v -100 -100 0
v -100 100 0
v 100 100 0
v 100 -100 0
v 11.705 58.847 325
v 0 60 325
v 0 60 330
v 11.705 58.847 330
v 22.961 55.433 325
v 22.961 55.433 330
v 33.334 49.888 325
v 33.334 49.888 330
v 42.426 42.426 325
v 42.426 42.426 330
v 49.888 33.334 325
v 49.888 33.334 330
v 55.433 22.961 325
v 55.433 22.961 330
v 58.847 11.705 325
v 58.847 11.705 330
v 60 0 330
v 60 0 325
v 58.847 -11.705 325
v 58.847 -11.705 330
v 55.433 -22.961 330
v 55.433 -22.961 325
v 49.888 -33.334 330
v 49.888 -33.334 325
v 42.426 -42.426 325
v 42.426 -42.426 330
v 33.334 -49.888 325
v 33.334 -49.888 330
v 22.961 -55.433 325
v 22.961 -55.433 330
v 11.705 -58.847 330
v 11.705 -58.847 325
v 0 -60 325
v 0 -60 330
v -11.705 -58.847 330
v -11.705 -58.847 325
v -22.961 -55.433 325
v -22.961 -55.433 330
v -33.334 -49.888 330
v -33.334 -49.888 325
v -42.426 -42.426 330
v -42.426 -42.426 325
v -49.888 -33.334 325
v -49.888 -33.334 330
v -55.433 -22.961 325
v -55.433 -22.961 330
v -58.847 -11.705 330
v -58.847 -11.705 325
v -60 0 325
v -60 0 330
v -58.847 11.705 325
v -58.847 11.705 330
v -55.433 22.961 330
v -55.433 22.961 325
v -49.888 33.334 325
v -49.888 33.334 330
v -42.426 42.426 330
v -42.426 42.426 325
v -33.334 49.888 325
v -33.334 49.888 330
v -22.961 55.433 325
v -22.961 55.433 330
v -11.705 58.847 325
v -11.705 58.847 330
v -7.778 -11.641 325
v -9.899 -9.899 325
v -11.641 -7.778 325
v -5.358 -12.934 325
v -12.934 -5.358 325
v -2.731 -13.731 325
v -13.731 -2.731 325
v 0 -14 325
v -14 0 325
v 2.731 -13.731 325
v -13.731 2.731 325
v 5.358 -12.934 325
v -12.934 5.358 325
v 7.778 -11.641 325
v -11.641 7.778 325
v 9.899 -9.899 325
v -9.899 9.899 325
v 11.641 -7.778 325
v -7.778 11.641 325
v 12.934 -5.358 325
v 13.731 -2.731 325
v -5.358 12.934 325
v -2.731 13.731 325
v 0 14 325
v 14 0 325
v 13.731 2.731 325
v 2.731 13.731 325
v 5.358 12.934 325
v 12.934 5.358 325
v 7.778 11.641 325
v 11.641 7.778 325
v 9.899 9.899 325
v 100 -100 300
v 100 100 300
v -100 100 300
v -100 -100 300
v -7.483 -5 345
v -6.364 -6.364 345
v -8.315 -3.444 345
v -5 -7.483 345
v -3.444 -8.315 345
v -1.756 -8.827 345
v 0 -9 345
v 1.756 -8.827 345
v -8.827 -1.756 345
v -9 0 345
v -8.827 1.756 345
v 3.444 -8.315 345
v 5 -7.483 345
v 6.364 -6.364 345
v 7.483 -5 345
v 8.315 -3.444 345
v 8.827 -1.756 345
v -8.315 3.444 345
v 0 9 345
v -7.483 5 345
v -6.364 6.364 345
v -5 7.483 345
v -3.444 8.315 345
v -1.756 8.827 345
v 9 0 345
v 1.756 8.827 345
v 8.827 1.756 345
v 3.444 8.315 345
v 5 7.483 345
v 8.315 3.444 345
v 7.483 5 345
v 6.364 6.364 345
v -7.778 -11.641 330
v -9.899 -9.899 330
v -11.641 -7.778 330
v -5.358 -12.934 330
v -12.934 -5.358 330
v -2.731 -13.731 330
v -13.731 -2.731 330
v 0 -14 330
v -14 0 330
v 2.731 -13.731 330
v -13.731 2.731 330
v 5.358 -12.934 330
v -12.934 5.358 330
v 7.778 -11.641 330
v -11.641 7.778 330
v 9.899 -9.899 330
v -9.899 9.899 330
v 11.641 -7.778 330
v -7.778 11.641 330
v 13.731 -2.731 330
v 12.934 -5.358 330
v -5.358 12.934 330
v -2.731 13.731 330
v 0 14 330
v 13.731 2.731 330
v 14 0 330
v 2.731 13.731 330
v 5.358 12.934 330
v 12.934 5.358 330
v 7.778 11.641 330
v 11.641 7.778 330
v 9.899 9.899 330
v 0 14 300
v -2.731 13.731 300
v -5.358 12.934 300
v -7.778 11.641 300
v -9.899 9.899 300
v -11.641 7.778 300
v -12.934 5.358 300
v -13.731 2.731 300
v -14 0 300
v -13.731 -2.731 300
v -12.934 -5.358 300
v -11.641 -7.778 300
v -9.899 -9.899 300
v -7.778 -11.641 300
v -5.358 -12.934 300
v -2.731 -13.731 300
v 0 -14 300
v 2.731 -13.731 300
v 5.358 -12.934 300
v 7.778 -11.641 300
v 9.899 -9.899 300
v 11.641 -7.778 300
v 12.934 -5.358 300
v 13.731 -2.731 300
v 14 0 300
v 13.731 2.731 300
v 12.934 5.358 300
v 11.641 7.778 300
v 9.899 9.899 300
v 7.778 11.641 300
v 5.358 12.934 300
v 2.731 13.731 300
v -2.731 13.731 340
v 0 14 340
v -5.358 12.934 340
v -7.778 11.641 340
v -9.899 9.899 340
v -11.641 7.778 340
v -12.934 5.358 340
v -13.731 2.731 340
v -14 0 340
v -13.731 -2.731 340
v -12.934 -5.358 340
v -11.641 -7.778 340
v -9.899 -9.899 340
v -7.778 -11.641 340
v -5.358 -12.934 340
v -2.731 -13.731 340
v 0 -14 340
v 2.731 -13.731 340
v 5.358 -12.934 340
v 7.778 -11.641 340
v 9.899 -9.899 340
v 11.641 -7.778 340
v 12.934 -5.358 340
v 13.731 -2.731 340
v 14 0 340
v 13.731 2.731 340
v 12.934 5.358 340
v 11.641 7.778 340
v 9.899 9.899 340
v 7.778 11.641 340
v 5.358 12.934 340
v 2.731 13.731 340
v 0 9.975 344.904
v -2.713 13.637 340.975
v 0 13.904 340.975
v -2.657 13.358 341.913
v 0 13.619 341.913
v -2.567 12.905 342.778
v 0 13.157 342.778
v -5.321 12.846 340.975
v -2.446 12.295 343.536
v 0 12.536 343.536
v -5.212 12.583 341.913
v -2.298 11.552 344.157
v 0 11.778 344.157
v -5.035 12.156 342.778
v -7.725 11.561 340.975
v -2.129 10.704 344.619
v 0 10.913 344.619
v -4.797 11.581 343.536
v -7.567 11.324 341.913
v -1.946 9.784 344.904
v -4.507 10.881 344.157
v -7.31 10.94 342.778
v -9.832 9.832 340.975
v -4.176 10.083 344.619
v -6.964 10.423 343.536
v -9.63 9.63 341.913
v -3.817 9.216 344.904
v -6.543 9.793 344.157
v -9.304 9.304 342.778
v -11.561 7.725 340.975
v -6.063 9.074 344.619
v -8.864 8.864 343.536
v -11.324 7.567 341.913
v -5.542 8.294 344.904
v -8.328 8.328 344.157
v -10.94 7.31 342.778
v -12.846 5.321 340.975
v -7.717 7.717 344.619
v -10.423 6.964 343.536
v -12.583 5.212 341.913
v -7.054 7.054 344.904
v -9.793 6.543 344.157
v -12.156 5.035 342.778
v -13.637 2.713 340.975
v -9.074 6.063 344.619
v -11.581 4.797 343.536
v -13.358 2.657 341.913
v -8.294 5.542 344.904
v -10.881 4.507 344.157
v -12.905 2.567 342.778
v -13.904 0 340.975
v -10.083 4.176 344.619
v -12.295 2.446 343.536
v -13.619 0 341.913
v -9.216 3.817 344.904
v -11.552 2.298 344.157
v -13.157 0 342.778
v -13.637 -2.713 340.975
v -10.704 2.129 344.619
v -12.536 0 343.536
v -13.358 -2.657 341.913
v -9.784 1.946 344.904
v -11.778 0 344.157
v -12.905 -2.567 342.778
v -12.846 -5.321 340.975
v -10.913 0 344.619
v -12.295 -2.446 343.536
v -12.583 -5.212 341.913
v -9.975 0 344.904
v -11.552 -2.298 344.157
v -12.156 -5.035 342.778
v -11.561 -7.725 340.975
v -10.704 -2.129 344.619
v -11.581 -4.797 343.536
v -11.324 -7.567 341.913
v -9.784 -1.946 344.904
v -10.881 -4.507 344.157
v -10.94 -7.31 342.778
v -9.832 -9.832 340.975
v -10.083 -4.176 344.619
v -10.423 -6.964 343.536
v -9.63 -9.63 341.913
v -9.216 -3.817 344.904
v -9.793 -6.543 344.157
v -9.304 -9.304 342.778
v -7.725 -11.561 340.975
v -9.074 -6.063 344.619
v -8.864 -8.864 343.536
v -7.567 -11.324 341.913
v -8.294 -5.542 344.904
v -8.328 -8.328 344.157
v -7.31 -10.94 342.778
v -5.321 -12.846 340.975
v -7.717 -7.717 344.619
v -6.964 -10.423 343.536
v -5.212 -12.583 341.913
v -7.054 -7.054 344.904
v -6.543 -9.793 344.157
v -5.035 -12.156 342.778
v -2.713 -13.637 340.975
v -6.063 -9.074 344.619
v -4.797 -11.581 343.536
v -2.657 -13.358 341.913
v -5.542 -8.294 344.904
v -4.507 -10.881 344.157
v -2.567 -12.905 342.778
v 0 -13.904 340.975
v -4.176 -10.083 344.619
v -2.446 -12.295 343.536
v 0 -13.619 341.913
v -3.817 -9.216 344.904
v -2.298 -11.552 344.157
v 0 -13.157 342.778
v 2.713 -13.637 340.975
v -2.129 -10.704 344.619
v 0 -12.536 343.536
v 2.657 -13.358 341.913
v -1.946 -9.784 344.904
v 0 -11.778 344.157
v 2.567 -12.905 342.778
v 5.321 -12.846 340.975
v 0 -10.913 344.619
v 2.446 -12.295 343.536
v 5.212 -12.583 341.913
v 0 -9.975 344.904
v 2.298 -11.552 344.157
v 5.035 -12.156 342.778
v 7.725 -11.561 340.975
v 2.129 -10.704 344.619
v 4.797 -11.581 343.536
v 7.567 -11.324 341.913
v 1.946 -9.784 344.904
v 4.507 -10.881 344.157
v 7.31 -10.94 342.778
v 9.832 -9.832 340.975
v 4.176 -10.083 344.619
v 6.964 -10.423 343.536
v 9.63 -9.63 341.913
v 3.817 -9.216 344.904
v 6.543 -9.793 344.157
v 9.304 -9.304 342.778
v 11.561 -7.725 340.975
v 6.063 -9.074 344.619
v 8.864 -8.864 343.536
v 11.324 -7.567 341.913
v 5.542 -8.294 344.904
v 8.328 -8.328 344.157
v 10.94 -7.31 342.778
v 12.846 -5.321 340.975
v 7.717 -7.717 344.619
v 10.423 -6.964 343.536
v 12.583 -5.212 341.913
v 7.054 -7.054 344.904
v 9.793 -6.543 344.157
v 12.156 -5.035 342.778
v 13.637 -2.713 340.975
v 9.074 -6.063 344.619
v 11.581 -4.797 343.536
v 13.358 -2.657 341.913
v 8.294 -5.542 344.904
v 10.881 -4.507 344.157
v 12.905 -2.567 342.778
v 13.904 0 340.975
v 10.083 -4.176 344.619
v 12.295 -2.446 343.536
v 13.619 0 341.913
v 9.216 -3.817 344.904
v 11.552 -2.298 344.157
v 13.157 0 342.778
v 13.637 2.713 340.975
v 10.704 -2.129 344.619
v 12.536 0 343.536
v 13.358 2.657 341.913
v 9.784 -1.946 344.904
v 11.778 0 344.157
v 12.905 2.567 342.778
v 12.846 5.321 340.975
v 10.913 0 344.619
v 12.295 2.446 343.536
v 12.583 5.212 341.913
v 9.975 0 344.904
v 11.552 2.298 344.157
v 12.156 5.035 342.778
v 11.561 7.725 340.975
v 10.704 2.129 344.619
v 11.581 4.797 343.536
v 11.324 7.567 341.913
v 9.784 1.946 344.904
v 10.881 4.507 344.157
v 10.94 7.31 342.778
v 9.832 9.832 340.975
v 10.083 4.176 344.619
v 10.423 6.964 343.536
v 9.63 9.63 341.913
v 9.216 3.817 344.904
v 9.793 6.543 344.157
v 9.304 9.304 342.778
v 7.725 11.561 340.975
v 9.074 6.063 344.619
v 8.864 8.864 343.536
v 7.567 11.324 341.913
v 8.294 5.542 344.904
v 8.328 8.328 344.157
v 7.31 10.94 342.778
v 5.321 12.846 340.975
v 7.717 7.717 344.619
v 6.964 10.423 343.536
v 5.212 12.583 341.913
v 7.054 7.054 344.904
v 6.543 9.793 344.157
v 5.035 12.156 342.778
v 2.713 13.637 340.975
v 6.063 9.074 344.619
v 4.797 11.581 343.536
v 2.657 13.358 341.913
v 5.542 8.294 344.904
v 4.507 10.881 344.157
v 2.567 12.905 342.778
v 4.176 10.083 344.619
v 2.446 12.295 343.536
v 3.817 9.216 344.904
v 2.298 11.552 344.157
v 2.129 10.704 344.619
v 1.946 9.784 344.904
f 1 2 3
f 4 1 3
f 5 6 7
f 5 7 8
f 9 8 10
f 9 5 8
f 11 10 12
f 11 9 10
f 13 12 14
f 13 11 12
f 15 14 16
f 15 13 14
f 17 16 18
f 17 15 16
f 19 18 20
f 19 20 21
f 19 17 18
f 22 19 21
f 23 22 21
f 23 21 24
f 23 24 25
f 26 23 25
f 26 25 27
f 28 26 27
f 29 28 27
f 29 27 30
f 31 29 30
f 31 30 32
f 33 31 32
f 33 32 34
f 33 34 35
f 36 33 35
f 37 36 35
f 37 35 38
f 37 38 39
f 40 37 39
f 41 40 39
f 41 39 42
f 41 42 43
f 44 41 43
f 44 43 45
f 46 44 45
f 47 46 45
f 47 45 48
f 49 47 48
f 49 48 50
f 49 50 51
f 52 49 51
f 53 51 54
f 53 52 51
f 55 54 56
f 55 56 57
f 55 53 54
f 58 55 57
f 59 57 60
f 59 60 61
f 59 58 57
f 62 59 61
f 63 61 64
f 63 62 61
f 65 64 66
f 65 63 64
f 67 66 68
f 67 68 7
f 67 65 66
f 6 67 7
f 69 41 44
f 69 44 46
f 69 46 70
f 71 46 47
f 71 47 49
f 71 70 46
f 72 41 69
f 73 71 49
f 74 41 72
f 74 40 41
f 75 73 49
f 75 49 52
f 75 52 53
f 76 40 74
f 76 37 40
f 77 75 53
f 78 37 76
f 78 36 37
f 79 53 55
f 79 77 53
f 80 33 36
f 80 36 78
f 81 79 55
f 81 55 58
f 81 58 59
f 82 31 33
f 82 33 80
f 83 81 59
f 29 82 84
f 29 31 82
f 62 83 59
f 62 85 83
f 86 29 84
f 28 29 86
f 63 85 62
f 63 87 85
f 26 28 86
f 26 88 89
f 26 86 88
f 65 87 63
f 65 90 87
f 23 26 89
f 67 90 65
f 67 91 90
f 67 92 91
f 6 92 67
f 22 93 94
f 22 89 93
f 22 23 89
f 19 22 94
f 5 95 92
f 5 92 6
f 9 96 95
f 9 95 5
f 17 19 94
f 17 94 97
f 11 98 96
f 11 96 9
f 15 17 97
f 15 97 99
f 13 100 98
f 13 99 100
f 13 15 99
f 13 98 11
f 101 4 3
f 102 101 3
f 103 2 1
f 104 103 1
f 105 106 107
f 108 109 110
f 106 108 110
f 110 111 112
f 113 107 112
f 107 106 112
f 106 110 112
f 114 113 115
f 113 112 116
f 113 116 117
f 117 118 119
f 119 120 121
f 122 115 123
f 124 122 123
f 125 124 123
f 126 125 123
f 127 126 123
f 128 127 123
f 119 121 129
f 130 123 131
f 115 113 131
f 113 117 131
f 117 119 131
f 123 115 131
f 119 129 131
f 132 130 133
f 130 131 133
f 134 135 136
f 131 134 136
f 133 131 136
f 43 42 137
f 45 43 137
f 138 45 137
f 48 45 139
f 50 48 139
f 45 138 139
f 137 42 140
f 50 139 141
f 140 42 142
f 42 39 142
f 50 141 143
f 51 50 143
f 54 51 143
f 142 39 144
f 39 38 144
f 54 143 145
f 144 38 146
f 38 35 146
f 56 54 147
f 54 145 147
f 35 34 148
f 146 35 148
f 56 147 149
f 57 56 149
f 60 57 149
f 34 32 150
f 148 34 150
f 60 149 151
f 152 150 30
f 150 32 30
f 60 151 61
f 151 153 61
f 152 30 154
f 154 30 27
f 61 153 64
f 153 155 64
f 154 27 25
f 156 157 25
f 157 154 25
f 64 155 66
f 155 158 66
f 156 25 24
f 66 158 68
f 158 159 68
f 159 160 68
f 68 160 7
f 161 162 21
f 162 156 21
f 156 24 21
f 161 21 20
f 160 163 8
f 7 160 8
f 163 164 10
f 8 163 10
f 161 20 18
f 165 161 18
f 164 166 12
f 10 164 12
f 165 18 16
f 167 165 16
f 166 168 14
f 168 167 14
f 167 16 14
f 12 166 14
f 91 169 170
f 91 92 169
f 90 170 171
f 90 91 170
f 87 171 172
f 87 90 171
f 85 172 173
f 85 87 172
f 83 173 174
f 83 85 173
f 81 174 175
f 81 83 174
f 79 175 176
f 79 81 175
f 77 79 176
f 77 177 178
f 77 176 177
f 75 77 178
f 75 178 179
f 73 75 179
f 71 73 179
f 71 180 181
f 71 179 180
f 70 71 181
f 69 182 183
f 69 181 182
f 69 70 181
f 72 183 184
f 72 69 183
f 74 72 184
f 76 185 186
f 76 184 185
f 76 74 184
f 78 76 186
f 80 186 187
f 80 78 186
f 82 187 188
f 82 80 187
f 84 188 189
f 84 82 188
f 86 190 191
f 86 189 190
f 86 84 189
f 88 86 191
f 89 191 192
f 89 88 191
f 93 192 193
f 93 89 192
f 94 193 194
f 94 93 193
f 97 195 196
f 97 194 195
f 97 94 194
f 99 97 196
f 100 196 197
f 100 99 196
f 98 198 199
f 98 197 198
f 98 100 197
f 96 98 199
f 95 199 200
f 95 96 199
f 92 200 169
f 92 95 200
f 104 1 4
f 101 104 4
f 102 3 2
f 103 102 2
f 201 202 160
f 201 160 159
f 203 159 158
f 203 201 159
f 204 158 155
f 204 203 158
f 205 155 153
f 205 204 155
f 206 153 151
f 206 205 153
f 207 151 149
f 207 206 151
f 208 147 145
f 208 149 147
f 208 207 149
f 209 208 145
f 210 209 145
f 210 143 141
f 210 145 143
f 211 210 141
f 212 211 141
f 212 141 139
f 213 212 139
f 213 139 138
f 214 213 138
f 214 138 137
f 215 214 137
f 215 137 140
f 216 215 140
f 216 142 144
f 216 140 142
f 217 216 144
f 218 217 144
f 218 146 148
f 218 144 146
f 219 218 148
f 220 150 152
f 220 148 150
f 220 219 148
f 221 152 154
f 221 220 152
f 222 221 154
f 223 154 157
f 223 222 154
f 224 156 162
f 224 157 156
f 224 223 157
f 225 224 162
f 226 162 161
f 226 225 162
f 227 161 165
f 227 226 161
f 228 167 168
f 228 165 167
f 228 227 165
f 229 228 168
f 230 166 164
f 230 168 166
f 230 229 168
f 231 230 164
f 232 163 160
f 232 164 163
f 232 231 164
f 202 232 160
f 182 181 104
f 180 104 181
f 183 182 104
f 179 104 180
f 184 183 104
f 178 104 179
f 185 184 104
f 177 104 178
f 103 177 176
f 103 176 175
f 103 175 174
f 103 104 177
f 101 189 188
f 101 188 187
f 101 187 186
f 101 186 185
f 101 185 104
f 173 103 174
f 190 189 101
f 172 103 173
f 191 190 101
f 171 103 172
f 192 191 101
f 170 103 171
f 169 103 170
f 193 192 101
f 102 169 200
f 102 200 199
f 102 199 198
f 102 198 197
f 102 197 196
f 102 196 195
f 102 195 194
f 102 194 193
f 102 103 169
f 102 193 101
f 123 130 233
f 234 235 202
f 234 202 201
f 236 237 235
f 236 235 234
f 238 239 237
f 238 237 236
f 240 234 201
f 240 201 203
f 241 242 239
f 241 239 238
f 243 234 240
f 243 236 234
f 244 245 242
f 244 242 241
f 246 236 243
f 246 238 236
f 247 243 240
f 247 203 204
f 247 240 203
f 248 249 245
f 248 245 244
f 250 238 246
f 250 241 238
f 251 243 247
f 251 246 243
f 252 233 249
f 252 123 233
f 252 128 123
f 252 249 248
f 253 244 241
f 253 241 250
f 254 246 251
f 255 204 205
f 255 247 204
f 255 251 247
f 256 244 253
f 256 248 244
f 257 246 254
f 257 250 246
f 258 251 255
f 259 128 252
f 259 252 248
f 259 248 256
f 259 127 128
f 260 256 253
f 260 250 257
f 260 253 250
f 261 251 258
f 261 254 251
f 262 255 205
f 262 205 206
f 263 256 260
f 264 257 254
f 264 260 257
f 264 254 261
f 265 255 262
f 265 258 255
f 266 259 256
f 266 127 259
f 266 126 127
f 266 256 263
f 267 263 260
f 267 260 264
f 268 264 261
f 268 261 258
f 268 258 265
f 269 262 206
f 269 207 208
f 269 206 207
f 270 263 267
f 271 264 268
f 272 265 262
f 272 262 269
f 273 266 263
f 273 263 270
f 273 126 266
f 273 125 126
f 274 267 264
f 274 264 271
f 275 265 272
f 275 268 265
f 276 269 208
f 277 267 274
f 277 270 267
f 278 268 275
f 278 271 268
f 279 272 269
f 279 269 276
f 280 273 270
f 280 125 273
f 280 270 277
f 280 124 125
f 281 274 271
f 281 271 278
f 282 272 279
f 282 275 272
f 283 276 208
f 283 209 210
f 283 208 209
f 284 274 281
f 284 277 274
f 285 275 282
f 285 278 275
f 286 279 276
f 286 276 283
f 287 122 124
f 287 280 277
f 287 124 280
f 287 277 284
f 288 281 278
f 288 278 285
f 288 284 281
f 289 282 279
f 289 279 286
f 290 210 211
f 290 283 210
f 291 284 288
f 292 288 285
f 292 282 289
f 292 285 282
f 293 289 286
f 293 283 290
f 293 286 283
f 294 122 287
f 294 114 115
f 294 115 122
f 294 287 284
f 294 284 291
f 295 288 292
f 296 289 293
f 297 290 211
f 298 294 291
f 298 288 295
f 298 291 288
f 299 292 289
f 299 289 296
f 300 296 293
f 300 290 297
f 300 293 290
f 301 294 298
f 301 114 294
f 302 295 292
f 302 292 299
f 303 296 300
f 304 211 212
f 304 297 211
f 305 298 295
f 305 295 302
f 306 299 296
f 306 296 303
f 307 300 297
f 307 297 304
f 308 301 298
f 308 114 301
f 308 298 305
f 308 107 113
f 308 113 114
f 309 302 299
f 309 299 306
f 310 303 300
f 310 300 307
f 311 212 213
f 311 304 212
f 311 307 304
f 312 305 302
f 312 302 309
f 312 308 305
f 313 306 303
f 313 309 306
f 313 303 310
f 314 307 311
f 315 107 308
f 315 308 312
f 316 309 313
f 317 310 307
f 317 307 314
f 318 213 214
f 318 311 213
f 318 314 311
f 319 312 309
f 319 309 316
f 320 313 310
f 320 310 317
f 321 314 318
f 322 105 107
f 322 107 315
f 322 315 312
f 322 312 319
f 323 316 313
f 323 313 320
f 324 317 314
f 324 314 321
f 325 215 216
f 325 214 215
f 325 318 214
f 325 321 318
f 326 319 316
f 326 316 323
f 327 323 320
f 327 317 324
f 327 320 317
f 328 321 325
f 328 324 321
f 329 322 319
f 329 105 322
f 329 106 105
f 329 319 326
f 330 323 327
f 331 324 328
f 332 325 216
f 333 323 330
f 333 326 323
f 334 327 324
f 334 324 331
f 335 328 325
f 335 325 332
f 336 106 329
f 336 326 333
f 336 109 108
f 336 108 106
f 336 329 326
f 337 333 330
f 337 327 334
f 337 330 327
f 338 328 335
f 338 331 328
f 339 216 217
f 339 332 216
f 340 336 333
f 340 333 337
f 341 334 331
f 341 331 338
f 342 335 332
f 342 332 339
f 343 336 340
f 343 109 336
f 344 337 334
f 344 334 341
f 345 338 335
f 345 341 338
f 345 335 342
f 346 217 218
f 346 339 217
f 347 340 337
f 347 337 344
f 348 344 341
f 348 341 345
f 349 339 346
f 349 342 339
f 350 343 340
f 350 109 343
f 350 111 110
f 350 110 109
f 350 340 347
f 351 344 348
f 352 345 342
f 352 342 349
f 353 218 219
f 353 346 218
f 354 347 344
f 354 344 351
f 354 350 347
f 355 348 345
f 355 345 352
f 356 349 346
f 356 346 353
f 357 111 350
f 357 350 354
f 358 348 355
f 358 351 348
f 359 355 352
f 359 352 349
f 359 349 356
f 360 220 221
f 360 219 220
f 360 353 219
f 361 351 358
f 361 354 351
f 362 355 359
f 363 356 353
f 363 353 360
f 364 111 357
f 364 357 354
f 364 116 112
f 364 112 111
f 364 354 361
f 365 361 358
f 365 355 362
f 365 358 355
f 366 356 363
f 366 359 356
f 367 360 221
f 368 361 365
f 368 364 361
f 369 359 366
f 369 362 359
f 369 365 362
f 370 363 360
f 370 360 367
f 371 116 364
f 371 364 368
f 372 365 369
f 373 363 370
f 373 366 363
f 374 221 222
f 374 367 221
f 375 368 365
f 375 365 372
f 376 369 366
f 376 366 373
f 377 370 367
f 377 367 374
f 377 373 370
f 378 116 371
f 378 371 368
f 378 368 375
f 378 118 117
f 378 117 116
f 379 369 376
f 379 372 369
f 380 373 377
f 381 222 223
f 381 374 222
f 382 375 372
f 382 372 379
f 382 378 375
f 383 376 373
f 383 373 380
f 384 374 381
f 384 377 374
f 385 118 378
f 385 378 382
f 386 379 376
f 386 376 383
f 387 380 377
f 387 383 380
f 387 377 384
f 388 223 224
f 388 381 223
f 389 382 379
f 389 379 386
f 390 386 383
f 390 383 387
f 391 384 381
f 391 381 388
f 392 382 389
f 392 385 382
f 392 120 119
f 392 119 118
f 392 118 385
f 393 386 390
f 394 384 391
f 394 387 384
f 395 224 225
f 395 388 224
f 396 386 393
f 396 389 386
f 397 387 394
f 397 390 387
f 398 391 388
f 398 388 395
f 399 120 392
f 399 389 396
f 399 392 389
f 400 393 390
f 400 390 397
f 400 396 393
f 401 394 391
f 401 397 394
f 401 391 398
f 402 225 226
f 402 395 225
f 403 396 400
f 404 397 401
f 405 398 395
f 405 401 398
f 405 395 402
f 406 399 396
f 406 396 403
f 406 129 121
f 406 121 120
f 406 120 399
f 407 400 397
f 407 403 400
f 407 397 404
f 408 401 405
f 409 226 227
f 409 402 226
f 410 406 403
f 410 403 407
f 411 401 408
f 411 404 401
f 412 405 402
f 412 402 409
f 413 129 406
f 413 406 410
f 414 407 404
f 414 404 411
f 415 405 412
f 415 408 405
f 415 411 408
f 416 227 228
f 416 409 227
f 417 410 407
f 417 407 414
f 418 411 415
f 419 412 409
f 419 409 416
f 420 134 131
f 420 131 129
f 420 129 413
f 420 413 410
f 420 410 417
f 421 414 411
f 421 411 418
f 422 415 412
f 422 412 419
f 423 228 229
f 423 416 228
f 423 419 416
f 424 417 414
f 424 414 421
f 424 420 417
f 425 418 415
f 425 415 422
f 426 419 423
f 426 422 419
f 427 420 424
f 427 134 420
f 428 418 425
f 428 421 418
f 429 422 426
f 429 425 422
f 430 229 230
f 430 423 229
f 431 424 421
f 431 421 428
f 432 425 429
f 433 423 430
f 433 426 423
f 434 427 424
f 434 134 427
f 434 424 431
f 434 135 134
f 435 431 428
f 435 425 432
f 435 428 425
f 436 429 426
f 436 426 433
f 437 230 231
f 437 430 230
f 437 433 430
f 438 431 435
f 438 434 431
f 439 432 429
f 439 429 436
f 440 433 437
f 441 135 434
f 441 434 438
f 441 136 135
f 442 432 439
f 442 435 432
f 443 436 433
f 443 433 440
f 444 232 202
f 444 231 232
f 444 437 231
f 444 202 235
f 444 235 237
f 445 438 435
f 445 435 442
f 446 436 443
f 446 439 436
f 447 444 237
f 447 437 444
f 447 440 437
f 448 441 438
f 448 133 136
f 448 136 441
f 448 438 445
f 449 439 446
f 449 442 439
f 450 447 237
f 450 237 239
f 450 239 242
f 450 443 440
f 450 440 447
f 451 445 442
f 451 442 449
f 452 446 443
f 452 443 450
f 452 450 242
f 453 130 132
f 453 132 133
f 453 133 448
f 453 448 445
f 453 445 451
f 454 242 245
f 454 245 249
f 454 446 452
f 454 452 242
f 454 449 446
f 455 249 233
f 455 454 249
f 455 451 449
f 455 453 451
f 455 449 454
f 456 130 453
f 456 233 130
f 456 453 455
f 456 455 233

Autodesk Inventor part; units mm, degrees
ref_plane "YZ Plane" through (0, 0, 0) normal (1, 0, 0) x (0, 1, 0)
ref_plane "XZ Plane" through (0, 0, 0) normal (0, 1, 0) x (-1, 0, 0)
ref_plane "XY Plane" through (0, 0, 0) normal (0, 0, 1) x (1, 0, 0)
sketch "スケッチ1" plane through (0, 0, 0) normal (0, 0, 1) x (1, 0, 0)
  line L0 (-100, -100) -> (100, -100)
  line L1 (100, -100) -> (100, 100)
  line L2 (100, 100) -> (-100, 100)
  line L3 (-100, 100) -> (-100, -100)
  line L4 (-100, -100) -> (100, 100) construction
  line L5 (100, -100) -> (-100, 100) construction
  point P0 (0, 0)
  dimension "d0" = 200
extrude "押し出し1" add sketch "スケッチ1" along normal blind 300
sketch "スケッチ2" plane through (0, 0, 0) normal (1, 0, 0) x (0, 1, 0)
  line L0 (0, 300) -> (14, 300)
  line L1 (14, 300) -> (14, 340)
  line L2 (9, 345) -> (0, 345)
  line L3 (0, 345) -> (0, 300)
  line L4 (100, 300) -> (-100, 300) projected
  line L5 (0, 330) -> (60, 330)
  line L6 (60, 330) -> (60, 325)
  line L7 (60, 325) -> (0, 325)
  line L8 (0, 325) -> (0, 330)
  arc A0 (14, 340) -> (9, 345) centre (9, 340) ccw
  point P0 (0, 0)
  dimension "d3" = 14
  dimension "d4" = 45
  dimension "d5" = 5
  dimension "d6" = 60
  dimension "d7" = 15
  dimension "d8" = 5
  dimension "d10" = 25
revolve "回転1" add sketch "スケッチ2" angle 360 about axis through (0, 0, 345) along (0, 0, -1)
properties part number "Wind Trubin Engine"
